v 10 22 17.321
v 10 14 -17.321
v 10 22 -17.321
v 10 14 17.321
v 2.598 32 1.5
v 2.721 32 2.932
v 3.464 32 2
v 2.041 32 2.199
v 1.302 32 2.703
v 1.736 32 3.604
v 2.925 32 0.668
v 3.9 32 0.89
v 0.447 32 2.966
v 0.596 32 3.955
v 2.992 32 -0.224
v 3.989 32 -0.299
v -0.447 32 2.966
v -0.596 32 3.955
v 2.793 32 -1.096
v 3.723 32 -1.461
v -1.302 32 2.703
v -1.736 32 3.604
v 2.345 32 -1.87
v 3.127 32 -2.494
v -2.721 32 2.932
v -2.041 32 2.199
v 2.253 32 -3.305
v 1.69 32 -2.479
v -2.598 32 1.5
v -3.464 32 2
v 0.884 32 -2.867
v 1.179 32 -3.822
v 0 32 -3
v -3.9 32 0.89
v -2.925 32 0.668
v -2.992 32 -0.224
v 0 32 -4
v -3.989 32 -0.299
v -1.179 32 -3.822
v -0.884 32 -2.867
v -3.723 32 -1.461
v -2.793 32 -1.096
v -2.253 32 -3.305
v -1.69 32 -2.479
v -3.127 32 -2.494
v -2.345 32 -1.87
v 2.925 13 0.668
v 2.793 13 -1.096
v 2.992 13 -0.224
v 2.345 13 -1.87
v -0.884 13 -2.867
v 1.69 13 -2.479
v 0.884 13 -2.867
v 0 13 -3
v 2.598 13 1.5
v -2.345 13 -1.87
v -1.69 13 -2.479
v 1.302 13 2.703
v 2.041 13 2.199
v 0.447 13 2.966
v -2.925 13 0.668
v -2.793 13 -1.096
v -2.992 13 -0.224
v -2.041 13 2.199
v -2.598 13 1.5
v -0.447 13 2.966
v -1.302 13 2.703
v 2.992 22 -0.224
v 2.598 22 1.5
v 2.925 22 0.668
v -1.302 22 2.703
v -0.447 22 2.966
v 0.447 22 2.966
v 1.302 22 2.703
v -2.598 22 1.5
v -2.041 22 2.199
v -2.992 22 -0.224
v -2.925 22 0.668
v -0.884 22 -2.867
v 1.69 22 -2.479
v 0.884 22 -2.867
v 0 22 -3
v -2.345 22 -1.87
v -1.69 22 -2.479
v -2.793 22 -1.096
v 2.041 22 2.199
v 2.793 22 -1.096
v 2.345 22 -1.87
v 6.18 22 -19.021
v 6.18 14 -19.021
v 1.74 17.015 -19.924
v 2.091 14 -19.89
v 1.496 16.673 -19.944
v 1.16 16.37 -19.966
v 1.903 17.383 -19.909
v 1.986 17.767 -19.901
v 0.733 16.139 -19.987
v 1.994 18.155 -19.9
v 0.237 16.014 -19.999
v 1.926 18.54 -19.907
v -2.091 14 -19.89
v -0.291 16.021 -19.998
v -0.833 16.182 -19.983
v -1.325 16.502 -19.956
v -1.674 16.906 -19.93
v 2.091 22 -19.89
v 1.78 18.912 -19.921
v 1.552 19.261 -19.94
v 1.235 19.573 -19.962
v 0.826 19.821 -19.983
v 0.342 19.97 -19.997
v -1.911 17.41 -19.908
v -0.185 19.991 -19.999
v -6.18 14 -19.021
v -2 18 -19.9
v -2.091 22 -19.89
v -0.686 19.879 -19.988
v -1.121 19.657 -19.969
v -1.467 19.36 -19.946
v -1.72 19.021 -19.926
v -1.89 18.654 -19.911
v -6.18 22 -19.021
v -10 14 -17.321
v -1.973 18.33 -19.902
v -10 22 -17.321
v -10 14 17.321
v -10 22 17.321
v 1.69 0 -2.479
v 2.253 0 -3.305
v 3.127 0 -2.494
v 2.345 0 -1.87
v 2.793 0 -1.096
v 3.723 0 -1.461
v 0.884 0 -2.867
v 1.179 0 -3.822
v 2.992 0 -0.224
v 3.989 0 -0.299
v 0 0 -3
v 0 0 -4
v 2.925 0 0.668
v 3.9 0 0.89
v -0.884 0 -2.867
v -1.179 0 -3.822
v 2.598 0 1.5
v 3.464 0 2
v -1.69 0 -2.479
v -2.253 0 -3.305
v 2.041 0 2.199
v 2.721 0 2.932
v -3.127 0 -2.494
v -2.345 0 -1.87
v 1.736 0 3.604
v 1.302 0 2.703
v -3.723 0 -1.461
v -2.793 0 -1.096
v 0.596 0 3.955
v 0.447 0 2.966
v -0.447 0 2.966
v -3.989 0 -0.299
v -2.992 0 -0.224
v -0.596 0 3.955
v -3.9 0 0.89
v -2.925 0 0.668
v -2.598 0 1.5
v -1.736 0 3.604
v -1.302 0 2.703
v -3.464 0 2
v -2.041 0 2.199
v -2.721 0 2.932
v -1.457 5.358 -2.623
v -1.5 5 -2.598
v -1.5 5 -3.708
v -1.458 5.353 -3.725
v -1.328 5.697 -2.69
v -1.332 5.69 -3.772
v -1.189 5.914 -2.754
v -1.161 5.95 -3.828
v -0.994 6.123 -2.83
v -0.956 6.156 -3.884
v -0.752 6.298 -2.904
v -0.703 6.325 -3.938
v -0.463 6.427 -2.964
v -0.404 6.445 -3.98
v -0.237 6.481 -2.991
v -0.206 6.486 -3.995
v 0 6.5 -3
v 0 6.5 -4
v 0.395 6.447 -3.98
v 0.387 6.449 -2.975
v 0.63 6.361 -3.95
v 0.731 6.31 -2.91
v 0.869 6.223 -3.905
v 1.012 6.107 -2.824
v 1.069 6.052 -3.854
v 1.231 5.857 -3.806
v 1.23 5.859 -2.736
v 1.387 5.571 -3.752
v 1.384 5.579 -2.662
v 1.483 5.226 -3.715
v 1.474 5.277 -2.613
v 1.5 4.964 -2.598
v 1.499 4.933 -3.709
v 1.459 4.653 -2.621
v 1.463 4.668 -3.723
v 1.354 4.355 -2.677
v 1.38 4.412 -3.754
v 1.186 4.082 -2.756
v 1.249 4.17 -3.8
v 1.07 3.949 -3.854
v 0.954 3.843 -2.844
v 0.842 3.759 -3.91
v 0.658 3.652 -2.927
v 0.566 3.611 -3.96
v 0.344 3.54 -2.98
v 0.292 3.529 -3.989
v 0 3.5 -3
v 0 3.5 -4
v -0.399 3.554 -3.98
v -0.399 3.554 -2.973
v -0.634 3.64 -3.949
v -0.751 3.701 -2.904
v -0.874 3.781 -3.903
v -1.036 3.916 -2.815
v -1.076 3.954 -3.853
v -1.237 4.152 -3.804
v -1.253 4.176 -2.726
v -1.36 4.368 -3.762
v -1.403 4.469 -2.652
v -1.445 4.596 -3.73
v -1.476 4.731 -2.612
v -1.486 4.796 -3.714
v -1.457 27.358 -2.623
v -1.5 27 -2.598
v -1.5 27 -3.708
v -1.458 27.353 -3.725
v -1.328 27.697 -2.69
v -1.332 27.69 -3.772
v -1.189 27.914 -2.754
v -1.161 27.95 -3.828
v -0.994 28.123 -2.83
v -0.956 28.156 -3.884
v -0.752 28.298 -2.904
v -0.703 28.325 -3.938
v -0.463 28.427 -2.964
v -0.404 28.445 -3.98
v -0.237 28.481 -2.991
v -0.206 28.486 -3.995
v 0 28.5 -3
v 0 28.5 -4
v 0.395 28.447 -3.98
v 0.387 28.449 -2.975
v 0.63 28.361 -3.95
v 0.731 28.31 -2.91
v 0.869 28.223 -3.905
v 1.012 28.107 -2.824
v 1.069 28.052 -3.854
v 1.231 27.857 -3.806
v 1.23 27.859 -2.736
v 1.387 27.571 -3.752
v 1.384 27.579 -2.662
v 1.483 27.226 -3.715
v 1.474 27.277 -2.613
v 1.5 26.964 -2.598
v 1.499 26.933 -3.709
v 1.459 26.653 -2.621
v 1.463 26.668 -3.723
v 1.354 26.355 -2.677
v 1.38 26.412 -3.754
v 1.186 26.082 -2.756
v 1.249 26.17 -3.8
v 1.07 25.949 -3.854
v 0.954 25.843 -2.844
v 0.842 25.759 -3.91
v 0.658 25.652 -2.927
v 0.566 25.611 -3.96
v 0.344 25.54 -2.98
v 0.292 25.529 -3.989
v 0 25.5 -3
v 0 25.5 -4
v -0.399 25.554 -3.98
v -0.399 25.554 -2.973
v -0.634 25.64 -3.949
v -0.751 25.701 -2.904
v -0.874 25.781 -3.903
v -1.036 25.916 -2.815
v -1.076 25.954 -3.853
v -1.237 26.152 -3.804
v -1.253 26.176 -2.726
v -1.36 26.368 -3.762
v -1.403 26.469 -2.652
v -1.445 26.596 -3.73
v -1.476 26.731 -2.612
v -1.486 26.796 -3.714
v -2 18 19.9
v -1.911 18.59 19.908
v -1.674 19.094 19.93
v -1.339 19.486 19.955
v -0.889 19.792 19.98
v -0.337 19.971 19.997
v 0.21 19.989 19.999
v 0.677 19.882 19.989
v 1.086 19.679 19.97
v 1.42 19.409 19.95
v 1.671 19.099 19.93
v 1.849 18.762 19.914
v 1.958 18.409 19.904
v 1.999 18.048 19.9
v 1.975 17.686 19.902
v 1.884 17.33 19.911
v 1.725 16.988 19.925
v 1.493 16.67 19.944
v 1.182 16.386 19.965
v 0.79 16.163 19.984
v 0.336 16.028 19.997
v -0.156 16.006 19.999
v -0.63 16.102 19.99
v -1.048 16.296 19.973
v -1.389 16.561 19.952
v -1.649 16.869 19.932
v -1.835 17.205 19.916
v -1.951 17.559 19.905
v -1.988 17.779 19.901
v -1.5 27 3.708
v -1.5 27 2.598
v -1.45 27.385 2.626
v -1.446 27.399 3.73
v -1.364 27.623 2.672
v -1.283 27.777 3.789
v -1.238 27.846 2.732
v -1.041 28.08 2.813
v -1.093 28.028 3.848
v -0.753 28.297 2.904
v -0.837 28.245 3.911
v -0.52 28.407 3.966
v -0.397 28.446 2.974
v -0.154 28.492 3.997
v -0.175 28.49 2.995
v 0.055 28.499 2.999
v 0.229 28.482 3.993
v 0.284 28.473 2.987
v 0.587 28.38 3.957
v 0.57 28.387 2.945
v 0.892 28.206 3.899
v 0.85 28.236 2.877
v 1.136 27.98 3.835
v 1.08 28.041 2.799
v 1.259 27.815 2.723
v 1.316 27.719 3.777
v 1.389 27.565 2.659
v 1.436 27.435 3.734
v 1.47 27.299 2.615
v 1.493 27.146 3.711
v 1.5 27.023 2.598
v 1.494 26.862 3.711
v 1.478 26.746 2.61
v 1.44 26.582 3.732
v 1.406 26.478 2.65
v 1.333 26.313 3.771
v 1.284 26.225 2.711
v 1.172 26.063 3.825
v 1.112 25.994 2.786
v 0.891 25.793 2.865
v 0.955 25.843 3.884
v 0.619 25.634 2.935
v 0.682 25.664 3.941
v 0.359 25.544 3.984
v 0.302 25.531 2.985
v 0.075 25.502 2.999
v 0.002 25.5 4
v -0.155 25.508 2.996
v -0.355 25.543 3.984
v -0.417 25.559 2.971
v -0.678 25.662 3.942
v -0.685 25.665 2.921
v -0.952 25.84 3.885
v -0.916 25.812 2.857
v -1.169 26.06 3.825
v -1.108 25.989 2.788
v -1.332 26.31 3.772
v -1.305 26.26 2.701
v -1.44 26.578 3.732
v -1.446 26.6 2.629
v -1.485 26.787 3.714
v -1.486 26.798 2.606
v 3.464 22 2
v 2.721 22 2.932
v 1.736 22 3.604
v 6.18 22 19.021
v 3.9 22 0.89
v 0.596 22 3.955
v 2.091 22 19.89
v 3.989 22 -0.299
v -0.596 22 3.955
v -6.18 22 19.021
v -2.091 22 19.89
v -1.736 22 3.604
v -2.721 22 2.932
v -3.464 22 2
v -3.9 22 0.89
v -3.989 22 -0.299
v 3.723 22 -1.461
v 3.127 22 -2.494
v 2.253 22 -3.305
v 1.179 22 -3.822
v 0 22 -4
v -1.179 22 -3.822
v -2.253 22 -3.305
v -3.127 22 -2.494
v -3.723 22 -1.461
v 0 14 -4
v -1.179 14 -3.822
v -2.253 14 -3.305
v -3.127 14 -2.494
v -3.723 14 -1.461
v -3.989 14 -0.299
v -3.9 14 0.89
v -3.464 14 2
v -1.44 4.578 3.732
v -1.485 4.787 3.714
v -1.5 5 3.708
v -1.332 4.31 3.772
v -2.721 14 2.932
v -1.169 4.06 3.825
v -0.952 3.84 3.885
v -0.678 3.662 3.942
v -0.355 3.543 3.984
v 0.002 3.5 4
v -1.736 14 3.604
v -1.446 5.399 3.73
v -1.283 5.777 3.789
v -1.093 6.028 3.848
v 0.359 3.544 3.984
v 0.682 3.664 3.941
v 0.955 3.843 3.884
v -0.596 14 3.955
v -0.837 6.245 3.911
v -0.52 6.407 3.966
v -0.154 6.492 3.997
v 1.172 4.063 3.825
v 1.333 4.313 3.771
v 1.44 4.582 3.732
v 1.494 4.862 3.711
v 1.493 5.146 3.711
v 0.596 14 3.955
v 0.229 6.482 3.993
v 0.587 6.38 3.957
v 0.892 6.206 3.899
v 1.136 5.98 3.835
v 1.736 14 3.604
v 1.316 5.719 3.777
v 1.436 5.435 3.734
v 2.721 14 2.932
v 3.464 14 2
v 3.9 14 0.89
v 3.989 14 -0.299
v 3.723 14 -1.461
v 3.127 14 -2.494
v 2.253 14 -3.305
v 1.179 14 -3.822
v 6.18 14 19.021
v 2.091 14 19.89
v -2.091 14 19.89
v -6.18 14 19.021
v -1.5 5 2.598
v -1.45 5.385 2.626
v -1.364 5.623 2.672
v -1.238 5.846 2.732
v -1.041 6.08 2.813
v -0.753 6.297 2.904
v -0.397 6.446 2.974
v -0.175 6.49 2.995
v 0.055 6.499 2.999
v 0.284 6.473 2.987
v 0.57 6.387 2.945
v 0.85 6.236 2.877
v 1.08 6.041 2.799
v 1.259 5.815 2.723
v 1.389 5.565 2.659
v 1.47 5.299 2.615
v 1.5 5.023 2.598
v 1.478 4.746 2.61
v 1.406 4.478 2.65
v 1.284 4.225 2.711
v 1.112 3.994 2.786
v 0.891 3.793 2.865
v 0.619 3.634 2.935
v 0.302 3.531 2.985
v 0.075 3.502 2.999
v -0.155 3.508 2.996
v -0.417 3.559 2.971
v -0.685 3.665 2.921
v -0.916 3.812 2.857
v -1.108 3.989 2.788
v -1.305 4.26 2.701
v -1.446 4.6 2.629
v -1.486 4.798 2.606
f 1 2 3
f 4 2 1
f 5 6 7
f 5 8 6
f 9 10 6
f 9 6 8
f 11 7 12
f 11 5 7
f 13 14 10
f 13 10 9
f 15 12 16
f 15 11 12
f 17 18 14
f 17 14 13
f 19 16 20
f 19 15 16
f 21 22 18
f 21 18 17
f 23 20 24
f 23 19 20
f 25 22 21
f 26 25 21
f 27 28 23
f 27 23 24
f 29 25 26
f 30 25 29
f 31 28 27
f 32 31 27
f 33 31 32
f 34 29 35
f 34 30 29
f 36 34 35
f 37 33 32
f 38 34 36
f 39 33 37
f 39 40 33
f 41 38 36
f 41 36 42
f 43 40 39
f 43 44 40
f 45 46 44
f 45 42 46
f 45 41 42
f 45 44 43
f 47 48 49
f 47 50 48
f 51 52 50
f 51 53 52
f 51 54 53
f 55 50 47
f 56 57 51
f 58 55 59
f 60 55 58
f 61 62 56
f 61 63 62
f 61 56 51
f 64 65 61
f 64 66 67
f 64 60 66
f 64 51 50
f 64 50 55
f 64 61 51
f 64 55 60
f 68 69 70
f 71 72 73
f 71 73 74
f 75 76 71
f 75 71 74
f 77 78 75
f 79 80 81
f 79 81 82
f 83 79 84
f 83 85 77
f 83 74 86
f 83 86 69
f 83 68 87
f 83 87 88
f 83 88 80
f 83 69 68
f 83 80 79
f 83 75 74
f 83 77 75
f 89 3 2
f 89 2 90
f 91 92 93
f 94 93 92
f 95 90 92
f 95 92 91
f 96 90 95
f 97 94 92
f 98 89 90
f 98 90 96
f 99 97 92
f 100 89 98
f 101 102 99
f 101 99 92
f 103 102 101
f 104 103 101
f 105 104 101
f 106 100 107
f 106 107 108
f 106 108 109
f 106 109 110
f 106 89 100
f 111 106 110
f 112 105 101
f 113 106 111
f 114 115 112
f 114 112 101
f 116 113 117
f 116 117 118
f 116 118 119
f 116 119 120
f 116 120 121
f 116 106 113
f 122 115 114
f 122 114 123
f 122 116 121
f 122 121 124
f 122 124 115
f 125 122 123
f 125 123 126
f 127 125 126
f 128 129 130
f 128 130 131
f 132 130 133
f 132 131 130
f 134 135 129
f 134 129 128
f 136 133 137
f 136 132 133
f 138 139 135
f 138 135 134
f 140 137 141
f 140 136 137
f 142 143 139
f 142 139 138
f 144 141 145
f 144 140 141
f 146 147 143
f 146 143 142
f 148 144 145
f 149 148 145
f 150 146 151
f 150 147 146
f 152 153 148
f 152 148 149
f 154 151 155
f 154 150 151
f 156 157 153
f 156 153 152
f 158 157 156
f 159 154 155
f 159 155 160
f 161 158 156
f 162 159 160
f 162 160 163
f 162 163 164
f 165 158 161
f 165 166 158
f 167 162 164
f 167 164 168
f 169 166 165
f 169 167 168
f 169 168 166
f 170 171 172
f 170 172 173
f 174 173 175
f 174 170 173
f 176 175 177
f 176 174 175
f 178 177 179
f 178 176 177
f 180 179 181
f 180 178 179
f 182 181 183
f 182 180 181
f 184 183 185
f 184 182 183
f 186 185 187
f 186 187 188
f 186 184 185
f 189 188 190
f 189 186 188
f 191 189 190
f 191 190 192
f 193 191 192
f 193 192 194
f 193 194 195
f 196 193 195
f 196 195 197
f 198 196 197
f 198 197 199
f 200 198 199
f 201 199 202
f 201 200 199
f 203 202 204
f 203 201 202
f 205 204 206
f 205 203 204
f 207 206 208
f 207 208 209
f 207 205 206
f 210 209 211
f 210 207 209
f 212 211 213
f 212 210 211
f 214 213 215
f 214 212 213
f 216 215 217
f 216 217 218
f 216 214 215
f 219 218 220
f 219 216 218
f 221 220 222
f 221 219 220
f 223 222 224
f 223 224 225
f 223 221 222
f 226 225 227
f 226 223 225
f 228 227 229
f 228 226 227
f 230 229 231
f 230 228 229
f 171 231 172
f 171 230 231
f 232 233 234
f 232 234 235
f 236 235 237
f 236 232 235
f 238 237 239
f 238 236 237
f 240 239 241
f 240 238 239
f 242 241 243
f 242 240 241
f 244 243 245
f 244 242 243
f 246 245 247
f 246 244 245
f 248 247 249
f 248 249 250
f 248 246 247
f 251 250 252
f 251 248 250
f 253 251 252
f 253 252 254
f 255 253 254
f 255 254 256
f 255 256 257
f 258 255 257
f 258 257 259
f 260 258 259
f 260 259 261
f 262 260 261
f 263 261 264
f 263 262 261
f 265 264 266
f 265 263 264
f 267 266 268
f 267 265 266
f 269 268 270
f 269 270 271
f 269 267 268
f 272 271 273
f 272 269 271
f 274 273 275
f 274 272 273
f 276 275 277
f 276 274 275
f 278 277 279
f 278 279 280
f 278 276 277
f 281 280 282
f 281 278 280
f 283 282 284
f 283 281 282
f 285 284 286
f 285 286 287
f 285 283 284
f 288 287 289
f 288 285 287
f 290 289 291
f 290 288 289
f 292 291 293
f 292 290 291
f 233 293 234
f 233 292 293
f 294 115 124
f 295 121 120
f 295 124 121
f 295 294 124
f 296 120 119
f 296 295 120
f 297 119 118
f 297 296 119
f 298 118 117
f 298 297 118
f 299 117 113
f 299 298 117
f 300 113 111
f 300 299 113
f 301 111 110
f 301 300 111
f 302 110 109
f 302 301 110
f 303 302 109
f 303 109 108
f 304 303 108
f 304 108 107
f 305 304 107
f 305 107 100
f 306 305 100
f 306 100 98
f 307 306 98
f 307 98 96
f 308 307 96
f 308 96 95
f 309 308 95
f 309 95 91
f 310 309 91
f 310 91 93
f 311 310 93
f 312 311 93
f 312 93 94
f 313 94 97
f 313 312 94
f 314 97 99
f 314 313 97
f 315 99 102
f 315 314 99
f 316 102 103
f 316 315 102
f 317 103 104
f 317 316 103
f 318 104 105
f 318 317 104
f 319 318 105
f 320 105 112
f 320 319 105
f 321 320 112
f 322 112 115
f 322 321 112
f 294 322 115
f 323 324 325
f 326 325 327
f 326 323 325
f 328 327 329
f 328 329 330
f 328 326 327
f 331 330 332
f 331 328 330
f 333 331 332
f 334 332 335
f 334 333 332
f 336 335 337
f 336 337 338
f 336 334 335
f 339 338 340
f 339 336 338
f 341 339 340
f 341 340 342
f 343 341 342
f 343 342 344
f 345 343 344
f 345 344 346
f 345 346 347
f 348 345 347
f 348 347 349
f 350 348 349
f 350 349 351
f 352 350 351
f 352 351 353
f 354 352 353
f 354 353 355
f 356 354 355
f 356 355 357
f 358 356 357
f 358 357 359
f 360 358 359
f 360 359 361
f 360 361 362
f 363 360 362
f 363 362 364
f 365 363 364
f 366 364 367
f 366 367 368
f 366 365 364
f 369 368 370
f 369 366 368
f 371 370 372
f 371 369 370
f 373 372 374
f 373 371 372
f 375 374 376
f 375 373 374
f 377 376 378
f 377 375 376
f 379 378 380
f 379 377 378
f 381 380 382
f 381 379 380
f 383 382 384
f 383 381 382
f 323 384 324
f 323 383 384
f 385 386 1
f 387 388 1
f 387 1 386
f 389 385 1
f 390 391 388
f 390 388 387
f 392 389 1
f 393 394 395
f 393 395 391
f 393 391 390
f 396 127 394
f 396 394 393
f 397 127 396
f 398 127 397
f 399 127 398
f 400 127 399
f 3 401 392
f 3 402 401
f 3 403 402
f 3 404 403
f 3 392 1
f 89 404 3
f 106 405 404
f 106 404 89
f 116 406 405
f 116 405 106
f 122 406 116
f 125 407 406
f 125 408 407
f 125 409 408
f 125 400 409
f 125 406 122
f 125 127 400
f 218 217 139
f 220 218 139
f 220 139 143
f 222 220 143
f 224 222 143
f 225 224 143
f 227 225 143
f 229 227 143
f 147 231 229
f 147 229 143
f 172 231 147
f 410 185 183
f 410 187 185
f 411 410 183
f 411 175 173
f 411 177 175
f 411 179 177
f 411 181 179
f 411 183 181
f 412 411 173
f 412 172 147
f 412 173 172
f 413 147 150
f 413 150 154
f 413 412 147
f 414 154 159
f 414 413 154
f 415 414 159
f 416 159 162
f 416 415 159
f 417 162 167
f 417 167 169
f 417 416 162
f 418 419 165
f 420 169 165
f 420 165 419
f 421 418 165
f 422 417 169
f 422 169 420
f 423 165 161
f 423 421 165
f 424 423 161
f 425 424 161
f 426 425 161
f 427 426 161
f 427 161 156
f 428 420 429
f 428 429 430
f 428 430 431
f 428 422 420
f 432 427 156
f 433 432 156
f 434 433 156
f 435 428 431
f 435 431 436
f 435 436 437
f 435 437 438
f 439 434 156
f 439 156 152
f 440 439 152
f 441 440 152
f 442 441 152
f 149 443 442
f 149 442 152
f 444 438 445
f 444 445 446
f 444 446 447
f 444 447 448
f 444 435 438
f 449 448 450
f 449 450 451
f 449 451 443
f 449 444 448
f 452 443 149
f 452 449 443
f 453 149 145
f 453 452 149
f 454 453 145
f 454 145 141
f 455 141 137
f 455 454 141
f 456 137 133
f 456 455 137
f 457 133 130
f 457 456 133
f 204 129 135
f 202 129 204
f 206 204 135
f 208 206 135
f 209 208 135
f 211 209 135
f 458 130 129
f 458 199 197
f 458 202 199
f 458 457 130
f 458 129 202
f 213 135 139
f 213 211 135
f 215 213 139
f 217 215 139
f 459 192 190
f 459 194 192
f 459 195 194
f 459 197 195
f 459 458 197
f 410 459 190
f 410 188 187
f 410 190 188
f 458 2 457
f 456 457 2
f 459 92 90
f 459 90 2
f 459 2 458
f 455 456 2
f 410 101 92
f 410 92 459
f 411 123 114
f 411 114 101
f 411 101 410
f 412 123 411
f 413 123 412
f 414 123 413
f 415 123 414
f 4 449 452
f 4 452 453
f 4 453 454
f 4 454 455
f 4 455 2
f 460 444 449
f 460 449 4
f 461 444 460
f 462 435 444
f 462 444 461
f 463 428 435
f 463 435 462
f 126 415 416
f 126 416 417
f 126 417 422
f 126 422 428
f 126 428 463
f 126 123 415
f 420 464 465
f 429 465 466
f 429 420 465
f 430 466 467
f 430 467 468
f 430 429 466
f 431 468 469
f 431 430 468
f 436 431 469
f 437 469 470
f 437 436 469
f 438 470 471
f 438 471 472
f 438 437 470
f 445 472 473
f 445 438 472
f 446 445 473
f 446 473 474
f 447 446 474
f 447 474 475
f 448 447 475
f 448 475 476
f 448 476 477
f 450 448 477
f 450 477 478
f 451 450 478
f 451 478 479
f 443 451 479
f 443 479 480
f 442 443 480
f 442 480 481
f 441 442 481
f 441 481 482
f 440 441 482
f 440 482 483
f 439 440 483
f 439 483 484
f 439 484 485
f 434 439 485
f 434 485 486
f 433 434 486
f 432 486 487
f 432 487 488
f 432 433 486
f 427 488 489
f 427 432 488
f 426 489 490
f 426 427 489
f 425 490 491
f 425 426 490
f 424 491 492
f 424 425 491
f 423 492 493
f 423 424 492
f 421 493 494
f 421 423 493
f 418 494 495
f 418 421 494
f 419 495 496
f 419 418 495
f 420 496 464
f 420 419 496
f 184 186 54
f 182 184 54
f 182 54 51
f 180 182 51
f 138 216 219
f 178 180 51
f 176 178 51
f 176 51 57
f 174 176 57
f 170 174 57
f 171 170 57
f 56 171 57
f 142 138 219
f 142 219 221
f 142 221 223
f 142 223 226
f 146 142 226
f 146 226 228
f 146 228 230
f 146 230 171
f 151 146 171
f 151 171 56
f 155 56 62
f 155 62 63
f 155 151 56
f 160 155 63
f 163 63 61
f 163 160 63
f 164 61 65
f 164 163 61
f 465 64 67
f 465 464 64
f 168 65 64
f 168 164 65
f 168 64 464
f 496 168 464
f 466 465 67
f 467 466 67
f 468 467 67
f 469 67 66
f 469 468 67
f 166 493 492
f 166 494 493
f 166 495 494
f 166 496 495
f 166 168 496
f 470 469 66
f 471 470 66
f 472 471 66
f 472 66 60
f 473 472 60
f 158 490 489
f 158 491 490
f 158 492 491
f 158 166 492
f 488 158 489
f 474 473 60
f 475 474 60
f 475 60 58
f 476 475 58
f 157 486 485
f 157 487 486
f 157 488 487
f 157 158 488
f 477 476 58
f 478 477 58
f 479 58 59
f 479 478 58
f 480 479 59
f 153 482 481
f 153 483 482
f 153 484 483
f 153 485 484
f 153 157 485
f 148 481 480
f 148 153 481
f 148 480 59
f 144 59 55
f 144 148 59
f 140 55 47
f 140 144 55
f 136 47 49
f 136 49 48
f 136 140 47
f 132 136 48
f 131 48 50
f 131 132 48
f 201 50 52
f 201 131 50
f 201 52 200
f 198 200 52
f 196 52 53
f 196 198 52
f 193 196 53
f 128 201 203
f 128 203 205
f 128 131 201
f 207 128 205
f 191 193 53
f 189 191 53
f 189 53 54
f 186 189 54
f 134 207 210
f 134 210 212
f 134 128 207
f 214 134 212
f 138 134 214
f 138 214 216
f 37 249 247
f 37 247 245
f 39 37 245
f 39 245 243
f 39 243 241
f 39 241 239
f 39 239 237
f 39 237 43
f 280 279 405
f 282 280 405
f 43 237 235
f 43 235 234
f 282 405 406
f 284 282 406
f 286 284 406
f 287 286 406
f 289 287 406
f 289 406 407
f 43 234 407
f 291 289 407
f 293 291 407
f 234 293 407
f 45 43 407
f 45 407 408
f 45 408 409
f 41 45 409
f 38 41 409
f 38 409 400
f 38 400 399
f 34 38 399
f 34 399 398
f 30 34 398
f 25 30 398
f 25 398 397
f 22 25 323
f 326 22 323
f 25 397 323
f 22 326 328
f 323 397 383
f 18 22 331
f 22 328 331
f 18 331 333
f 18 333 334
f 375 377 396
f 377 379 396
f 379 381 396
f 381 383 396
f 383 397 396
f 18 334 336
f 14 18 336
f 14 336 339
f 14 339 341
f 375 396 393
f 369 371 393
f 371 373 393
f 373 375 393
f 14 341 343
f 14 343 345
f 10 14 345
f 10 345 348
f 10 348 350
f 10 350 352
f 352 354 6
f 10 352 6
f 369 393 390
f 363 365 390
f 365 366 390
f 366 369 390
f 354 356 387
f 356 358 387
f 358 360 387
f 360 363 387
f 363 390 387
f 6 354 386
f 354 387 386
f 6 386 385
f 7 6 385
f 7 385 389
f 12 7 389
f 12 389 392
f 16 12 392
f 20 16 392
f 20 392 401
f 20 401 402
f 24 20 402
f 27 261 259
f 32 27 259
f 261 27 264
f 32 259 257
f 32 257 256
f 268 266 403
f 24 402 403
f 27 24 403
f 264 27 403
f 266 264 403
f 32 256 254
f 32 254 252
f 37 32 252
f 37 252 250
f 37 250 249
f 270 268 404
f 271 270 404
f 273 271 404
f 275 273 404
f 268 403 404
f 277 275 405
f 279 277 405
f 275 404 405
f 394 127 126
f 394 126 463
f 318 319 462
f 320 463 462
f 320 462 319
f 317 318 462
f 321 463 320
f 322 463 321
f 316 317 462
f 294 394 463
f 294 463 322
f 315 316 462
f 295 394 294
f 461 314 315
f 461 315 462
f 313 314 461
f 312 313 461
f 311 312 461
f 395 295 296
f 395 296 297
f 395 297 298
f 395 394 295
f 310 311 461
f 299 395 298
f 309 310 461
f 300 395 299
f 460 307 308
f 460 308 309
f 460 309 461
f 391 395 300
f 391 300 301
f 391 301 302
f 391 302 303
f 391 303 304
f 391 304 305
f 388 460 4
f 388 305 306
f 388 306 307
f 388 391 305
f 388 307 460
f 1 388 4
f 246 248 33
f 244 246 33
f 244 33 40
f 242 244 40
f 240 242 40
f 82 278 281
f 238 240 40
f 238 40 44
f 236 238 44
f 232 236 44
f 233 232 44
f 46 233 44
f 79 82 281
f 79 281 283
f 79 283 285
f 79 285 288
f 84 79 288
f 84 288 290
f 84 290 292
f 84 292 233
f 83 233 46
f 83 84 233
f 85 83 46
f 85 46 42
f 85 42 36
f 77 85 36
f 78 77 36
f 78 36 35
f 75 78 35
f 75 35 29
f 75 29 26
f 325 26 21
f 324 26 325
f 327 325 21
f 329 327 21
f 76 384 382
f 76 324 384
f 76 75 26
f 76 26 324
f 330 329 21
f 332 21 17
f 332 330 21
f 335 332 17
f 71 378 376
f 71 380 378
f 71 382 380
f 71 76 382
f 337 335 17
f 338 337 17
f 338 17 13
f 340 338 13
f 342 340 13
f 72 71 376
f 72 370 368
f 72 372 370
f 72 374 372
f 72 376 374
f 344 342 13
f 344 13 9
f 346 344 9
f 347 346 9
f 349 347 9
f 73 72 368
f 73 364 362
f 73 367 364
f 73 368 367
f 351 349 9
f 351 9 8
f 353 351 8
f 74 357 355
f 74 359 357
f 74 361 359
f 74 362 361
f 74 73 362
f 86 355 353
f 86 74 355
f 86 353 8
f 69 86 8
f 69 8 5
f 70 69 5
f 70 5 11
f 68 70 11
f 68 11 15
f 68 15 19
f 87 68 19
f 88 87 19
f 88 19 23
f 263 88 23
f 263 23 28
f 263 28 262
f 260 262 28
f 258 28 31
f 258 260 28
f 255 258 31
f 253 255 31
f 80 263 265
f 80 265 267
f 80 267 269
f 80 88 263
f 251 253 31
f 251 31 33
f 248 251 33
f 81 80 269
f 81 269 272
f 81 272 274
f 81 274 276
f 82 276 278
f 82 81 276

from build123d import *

# Parameters (mm, degrees)
SKETCH2_R               = 4
SKETCH2_R_2             = 3
BOSS_EXTRUDE1_DEPTH     = 10
CUT_EXTRUDE1_DEPTH      = 45.72135955
CUT_EXTRUDE1_DEPTH_BACK = 45.72135955
SKETCH3_R               = 1.5
SKETCH3_R_2             = 2
SKETCH4_W               = 20
SKETCH4_H               = 45
CUT_EXTRUDE2_DEPTH      = 10


with BuildPart() as part:
    # Sketch1 → Revolve1 (revolve)
    with BuildSketch(Plane.XY, mode=Mode.PRIVATE) as revolve1_sk:
        Polygon((3, 0), (4, 0), (4, 14), (20, 14), (20, 22), (0, 22), (0, 13), (3, 13), align=None)
    revolve(revolve1_sk.sketch.rotate(Axis((0, 0, 0), (0, 1, 0)), 90), axis=Axis((0, 0, 0), (0, 1, 0)))

    # Sketch2 → Boss-Extrude1 (add)
    with BuildSketch(Plane(origin=(0, 22, 0), x_dir=(1, 0, 0), z_dir=(0, 1, 0))):
        with Locations(Location((0, 0, 0), (0, 0, 90))):
            Circle(SKETCH2_R)
        with Locations(Location((0, 0, 0), (0, 0, 90))):
            Circle(SKETCH2_R_2, mode=Mode.SUBTRACT)
    extrude(amount=BOSS_EXTRUDE1_DEPTH)

    # Sketch3 → Cut-Extrude1 (cut, two sides: drawn at the far end of the back side and taken through both)
    with BuildSketch(Plane(origin=(0, 0, -4), x_dir=(-1, 0, 0), z_dir=(0, 0, -1)).offset(-CUT_EXTRUDE1_DEPTH_BACK)):
        with Locations((0, 5)):
            Circle(SKETCH3_R)
        with Locations((0, 27)):
            Circle(SKETCH3_R)
        with Locations((0, 18)):
            Circle(SKETCH3_R_2)
    extrude(amount=CUT_EXTRUDE1_DEPTH + CUT_EXTRUDE1_DEPTH_BACK, mode=Mode.SUBTRACT)

    # Sketch4 → Cut-Extrude2 (cut)
    with BuildSketch(Plane.XZ.offset(-14)):
        with Locations((-20, 0)):
            Rectangle(SKETCH4_W, SKETCH4_H)
        with Locations((20, 0)):
            Rectangle(SKETCH4_W, SKETCH4_H)
    extrude(amount=-CUT_EXTRUDE2_DEPTH, mode=Mode.SUBTRACT)


solid = part.part
